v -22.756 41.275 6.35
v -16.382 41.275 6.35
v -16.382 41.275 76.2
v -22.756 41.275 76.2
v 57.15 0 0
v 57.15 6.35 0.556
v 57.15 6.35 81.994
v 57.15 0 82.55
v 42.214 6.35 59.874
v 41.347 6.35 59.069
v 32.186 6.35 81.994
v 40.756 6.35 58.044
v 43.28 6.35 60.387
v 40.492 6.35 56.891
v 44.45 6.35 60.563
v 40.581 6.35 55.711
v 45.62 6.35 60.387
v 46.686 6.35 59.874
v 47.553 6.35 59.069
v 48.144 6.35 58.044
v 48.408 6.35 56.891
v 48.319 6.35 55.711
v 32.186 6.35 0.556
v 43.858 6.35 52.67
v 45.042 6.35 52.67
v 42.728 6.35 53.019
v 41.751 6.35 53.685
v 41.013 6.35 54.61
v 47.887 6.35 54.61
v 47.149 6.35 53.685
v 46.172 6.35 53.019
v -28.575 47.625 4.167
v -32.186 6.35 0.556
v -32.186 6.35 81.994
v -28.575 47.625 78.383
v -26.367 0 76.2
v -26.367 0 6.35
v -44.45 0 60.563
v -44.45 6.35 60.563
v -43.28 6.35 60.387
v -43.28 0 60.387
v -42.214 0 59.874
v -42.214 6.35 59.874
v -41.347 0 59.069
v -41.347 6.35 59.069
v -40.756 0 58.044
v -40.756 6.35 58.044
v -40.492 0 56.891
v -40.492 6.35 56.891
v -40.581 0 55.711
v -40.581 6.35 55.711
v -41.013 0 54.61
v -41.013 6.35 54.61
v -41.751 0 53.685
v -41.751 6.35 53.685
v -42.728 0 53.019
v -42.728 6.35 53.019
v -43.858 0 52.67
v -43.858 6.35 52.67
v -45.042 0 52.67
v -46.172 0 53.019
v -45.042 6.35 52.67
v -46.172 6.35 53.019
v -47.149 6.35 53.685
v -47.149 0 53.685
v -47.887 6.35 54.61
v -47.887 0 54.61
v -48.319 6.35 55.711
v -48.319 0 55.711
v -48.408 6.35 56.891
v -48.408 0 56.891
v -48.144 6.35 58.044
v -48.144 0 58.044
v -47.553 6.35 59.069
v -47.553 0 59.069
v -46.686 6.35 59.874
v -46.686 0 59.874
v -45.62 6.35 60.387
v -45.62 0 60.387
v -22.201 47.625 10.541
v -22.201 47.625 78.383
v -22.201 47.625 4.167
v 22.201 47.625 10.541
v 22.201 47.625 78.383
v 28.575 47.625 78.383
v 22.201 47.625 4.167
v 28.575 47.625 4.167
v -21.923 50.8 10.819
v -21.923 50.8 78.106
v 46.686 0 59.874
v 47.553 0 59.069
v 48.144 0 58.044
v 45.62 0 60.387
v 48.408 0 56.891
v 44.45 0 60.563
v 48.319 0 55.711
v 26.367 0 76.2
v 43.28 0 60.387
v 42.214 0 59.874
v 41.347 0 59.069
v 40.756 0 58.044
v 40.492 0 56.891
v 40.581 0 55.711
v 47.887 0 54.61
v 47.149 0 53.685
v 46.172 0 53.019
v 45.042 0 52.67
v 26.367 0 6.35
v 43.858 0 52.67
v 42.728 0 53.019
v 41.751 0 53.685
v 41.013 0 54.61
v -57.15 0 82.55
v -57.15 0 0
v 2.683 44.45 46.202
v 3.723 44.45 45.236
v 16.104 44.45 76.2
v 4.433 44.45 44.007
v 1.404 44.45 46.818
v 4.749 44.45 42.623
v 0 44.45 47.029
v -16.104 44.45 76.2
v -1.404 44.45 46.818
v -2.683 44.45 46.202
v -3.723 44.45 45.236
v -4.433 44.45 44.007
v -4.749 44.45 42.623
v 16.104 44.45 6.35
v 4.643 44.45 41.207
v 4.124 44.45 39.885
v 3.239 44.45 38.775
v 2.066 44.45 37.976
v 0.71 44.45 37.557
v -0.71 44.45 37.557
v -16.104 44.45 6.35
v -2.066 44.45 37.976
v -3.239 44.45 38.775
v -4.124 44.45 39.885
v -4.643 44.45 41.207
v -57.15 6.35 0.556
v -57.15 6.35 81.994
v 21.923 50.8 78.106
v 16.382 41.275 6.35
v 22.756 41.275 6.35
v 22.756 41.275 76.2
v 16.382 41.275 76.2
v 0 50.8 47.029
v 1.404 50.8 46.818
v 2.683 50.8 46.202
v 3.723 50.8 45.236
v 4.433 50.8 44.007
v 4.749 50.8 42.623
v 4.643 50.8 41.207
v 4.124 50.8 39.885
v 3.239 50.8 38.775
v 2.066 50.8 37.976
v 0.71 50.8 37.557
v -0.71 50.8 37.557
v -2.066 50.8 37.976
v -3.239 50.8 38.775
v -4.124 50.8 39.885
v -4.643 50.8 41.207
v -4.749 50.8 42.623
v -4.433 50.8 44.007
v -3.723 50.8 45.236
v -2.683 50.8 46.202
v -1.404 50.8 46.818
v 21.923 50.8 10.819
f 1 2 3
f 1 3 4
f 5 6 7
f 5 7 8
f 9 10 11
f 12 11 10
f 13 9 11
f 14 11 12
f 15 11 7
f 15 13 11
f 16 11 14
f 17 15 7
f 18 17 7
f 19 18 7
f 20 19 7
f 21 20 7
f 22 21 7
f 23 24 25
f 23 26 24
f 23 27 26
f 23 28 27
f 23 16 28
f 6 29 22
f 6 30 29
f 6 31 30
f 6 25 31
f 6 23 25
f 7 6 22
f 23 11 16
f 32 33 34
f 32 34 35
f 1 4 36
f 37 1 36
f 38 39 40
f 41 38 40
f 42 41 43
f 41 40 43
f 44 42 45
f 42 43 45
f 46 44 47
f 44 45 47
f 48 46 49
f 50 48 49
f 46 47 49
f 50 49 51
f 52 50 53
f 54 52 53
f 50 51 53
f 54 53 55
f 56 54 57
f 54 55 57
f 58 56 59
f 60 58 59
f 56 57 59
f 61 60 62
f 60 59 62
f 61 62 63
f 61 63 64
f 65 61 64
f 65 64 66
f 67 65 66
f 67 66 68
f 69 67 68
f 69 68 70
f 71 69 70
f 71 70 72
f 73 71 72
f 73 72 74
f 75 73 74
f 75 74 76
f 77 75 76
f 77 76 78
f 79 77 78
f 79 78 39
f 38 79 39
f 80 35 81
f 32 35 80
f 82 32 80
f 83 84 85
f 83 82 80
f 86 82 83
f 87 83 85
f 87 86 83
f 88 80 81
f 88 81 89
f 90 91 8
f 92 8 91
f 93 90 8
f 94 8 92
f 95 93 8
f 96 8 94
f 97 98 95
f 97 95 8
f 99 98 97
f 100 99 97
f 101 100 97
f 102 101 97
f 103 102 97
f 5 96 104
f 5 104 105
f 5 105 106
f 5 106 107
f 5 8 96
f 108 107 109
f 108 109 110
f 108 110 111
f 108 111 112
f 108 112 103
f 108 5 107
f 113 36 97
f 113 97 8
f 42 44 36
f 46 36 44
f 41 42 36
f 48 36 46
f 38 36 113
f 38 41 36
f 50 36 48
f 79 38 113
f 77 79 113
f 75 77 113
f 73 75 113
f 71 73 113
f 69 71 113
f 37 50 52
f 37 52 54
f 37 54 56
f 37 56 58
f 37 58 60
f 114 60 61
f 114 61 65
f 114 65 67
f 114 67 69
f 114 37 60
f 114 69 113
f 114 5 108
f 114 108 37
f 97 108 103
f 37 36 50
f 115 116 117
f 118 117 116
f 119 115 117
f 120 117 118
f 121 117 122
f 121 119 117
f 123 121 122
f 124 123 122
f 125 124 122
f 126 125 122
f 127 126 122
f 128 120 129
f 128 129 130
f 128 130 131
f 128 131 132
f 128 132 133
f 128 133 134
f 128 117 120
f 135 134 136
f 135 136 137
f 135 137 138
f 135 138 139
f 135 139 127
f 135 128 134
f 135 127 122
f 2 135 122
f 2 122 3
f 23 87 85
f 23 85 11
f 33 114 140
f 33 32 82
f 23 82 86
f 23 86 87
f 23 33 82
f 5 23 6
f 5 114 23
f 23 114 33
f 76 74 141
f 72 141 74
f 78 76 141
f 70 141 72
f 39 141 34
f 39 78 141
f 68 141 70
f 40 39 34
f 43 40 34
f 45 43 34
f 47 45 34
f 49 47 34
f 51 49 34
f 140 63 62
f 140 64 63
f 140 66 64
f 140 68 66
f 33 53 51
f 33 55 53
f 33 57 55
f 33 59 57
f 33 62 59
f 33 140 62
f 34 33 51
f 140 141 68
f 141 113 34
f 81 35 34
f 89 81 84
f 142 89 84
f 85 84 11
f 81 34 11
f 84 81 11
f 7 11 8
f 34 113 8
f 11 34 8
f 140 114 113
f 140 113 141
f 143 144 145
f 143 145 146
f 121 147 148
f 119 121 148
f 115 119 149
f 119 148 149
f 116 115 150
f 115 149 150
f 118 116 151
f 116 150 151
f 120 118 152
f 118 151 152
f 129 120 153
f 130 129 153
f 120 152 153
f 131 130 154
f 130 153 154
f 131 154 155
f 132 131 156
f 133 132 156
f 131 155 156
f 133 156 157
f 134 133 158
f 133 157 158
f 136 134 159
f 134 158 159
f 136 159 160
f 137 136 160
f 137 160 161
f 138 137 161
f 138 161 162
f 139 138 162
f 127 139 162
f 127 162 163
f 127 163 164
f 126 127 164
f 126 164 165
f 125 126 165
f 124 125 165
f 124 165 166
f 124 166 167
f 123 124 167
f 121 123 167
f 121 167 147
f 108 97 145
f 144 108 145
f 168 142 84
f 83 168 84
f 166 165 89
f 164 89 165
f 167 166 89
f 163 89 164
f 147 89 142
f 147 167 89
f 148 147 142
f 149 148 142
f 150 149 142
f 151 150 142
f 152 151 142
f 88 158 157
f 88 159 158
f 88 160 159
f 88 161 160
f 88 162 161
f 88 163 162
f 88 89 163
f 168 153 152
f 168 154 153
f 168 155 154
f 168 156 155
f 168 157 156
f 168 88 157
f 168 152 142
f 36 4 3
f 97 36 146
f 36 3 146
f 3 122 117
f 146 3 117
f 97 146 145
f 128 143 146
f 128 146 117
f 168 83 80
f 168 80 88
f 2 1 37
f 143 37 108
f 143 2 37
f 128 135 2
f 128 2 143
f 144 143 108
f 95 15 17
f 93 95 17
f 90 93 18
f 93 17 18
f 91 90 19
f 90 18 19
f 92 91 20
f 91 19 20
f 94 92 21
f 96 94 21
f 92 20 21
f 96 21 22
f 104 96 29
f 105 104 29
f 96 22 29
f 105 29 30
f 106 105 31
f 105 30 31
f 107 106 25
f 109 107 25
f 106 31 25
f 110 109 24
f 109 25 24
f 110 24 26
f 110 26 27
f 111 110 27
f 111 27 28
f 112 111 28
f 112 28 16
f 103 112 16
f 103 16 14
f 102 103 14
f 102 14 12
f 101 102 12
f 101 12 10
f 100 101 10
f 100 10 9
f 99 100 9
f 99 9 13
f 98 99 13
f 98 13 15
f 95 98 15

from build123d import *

# Parameters (mm, degrees)
BOSS_EXTRUDE1_DEPTH     = 82.55
SHELL1_START            = 6.35
SHELL1_DEPTH            = 69.85
SKETCH4_W               = 176.485735693
SKETCH4_H               = 90.097834431
CUT_EXTRUDE1_DEPTH      = 25.4
CUT_EXTRUDE2_DEPTH      = 113.522286681
CUT_EXTRUDE2_DEPTH_BACK = 113.522286681
SKETCH8_R               = 4.7625
SKETCH8_R_2             = 3.96875
CUT_EXTRUDE3_DEPTH      = 113.522286681


# Read off the part's stored shape, not the designer's step: Shell1
with BuildPart() as part:
    # Sketch1 → Boss-Extrude1 (new body)
    with BuildSketch(Plane.XY):
        Polygon((57.15, 0), (-57.15, 0), (-57.15, 6.35), (-32.186094587, 6.35), (-28.575, 47.625), (-22.200744032, 47.625), (-21.922967525, 50.8), (21.922967525, 50.8), (22.200744032, 47.625), (28.575, 47.625), (32.186094587, 6.35), (57.15, 6.35), align=None)
    extrude(amount=BOSS_EXTRUDE1_DEPTH)

    # Shell1 outline → Shell1 (cut)
    with BuildSketch(Plane.XY.offset(SHELL1_START)):
        Polygon((26.367391632, 0), (22.756297045, 41.275), (16.382041077, 41.275), (16.10426457, 44.45), (-16.10426457, 44.45), (-16.382041077, 41.275), (-22.756297045, 41.275), (-26.367391632, 0), align=None)
    extrude(amount=SHELL1_DEPTH, mode=Mode.SUBTRACT)

    # Sketch4 → Cut-Extrude1 (cut)
    with BuildSketch(Plane(origin=(0, 0, 0), x_dir=(1, 0, 0), z_dir=(0, 0.08715574274765504, -0.9961946980917459))):
        with Locations((12.432297096, -27.899571849)):
            Rectangle(SKETCH4_W, SKETCH4_H)
    cut_extrude1 = extrude(amount=CUT_EXTRUDE1_DEPTH, mode=Mode.SUBTRACT)

    # Sketch7 → Cut-Extrude2 (cut, two sides: drawn at the far end of the back side and taken through both)
    with BuildSketch(Plane(origin=(0, 0, 0), x_dir=(0, 0, -1), z_dir=(1, 0, 0)).offset(-CUT_EXTRUDE2_DEPTH_BACK)):
        Polygon((-4.1666476, 47.625), (-10.540903569, 47.625), (-10.818680076, 50.8), (-4.444424107, 50.8), align=None)
    extrude(amount=CUT_EXTRUDE2_DEPTH + CUT_EXTRUDE2_DEPTH_BACK, mode=Mode.SUBTRACT)

    # Mirror1: Cut-Extrude1 across plane
    add(cut_extrude1.mirror(Plane.XY.offset(41.275)), mode=Mode.SUBTRACT)

    # Sketch8 → Cut-Extrude3 (cut, through all)
    with BuildSketch(Plane(origin=(0, 50.8, 0), x_dir=(1, 0, 0), z_dir=(0, 1, 0))):
        with Locations(Location((0, -42.2666476, 0), (0, 0, 270))):
            Circle(SKETCH8_R)
        with Locations(Location((44.45, -56.594446987, 0), (0, 0, 270))):
            Circle(SKETCH8_R_2)
        with Locations(Location((-44.45, -56.594446987, 0), (0, 0, 270))):
            Circle(SKETCH8_R_2)
    extrude(amount=-CUT_EXTRUDE3_DEPTH, mode=Mode.SUBTRACT)


solid = part.part
